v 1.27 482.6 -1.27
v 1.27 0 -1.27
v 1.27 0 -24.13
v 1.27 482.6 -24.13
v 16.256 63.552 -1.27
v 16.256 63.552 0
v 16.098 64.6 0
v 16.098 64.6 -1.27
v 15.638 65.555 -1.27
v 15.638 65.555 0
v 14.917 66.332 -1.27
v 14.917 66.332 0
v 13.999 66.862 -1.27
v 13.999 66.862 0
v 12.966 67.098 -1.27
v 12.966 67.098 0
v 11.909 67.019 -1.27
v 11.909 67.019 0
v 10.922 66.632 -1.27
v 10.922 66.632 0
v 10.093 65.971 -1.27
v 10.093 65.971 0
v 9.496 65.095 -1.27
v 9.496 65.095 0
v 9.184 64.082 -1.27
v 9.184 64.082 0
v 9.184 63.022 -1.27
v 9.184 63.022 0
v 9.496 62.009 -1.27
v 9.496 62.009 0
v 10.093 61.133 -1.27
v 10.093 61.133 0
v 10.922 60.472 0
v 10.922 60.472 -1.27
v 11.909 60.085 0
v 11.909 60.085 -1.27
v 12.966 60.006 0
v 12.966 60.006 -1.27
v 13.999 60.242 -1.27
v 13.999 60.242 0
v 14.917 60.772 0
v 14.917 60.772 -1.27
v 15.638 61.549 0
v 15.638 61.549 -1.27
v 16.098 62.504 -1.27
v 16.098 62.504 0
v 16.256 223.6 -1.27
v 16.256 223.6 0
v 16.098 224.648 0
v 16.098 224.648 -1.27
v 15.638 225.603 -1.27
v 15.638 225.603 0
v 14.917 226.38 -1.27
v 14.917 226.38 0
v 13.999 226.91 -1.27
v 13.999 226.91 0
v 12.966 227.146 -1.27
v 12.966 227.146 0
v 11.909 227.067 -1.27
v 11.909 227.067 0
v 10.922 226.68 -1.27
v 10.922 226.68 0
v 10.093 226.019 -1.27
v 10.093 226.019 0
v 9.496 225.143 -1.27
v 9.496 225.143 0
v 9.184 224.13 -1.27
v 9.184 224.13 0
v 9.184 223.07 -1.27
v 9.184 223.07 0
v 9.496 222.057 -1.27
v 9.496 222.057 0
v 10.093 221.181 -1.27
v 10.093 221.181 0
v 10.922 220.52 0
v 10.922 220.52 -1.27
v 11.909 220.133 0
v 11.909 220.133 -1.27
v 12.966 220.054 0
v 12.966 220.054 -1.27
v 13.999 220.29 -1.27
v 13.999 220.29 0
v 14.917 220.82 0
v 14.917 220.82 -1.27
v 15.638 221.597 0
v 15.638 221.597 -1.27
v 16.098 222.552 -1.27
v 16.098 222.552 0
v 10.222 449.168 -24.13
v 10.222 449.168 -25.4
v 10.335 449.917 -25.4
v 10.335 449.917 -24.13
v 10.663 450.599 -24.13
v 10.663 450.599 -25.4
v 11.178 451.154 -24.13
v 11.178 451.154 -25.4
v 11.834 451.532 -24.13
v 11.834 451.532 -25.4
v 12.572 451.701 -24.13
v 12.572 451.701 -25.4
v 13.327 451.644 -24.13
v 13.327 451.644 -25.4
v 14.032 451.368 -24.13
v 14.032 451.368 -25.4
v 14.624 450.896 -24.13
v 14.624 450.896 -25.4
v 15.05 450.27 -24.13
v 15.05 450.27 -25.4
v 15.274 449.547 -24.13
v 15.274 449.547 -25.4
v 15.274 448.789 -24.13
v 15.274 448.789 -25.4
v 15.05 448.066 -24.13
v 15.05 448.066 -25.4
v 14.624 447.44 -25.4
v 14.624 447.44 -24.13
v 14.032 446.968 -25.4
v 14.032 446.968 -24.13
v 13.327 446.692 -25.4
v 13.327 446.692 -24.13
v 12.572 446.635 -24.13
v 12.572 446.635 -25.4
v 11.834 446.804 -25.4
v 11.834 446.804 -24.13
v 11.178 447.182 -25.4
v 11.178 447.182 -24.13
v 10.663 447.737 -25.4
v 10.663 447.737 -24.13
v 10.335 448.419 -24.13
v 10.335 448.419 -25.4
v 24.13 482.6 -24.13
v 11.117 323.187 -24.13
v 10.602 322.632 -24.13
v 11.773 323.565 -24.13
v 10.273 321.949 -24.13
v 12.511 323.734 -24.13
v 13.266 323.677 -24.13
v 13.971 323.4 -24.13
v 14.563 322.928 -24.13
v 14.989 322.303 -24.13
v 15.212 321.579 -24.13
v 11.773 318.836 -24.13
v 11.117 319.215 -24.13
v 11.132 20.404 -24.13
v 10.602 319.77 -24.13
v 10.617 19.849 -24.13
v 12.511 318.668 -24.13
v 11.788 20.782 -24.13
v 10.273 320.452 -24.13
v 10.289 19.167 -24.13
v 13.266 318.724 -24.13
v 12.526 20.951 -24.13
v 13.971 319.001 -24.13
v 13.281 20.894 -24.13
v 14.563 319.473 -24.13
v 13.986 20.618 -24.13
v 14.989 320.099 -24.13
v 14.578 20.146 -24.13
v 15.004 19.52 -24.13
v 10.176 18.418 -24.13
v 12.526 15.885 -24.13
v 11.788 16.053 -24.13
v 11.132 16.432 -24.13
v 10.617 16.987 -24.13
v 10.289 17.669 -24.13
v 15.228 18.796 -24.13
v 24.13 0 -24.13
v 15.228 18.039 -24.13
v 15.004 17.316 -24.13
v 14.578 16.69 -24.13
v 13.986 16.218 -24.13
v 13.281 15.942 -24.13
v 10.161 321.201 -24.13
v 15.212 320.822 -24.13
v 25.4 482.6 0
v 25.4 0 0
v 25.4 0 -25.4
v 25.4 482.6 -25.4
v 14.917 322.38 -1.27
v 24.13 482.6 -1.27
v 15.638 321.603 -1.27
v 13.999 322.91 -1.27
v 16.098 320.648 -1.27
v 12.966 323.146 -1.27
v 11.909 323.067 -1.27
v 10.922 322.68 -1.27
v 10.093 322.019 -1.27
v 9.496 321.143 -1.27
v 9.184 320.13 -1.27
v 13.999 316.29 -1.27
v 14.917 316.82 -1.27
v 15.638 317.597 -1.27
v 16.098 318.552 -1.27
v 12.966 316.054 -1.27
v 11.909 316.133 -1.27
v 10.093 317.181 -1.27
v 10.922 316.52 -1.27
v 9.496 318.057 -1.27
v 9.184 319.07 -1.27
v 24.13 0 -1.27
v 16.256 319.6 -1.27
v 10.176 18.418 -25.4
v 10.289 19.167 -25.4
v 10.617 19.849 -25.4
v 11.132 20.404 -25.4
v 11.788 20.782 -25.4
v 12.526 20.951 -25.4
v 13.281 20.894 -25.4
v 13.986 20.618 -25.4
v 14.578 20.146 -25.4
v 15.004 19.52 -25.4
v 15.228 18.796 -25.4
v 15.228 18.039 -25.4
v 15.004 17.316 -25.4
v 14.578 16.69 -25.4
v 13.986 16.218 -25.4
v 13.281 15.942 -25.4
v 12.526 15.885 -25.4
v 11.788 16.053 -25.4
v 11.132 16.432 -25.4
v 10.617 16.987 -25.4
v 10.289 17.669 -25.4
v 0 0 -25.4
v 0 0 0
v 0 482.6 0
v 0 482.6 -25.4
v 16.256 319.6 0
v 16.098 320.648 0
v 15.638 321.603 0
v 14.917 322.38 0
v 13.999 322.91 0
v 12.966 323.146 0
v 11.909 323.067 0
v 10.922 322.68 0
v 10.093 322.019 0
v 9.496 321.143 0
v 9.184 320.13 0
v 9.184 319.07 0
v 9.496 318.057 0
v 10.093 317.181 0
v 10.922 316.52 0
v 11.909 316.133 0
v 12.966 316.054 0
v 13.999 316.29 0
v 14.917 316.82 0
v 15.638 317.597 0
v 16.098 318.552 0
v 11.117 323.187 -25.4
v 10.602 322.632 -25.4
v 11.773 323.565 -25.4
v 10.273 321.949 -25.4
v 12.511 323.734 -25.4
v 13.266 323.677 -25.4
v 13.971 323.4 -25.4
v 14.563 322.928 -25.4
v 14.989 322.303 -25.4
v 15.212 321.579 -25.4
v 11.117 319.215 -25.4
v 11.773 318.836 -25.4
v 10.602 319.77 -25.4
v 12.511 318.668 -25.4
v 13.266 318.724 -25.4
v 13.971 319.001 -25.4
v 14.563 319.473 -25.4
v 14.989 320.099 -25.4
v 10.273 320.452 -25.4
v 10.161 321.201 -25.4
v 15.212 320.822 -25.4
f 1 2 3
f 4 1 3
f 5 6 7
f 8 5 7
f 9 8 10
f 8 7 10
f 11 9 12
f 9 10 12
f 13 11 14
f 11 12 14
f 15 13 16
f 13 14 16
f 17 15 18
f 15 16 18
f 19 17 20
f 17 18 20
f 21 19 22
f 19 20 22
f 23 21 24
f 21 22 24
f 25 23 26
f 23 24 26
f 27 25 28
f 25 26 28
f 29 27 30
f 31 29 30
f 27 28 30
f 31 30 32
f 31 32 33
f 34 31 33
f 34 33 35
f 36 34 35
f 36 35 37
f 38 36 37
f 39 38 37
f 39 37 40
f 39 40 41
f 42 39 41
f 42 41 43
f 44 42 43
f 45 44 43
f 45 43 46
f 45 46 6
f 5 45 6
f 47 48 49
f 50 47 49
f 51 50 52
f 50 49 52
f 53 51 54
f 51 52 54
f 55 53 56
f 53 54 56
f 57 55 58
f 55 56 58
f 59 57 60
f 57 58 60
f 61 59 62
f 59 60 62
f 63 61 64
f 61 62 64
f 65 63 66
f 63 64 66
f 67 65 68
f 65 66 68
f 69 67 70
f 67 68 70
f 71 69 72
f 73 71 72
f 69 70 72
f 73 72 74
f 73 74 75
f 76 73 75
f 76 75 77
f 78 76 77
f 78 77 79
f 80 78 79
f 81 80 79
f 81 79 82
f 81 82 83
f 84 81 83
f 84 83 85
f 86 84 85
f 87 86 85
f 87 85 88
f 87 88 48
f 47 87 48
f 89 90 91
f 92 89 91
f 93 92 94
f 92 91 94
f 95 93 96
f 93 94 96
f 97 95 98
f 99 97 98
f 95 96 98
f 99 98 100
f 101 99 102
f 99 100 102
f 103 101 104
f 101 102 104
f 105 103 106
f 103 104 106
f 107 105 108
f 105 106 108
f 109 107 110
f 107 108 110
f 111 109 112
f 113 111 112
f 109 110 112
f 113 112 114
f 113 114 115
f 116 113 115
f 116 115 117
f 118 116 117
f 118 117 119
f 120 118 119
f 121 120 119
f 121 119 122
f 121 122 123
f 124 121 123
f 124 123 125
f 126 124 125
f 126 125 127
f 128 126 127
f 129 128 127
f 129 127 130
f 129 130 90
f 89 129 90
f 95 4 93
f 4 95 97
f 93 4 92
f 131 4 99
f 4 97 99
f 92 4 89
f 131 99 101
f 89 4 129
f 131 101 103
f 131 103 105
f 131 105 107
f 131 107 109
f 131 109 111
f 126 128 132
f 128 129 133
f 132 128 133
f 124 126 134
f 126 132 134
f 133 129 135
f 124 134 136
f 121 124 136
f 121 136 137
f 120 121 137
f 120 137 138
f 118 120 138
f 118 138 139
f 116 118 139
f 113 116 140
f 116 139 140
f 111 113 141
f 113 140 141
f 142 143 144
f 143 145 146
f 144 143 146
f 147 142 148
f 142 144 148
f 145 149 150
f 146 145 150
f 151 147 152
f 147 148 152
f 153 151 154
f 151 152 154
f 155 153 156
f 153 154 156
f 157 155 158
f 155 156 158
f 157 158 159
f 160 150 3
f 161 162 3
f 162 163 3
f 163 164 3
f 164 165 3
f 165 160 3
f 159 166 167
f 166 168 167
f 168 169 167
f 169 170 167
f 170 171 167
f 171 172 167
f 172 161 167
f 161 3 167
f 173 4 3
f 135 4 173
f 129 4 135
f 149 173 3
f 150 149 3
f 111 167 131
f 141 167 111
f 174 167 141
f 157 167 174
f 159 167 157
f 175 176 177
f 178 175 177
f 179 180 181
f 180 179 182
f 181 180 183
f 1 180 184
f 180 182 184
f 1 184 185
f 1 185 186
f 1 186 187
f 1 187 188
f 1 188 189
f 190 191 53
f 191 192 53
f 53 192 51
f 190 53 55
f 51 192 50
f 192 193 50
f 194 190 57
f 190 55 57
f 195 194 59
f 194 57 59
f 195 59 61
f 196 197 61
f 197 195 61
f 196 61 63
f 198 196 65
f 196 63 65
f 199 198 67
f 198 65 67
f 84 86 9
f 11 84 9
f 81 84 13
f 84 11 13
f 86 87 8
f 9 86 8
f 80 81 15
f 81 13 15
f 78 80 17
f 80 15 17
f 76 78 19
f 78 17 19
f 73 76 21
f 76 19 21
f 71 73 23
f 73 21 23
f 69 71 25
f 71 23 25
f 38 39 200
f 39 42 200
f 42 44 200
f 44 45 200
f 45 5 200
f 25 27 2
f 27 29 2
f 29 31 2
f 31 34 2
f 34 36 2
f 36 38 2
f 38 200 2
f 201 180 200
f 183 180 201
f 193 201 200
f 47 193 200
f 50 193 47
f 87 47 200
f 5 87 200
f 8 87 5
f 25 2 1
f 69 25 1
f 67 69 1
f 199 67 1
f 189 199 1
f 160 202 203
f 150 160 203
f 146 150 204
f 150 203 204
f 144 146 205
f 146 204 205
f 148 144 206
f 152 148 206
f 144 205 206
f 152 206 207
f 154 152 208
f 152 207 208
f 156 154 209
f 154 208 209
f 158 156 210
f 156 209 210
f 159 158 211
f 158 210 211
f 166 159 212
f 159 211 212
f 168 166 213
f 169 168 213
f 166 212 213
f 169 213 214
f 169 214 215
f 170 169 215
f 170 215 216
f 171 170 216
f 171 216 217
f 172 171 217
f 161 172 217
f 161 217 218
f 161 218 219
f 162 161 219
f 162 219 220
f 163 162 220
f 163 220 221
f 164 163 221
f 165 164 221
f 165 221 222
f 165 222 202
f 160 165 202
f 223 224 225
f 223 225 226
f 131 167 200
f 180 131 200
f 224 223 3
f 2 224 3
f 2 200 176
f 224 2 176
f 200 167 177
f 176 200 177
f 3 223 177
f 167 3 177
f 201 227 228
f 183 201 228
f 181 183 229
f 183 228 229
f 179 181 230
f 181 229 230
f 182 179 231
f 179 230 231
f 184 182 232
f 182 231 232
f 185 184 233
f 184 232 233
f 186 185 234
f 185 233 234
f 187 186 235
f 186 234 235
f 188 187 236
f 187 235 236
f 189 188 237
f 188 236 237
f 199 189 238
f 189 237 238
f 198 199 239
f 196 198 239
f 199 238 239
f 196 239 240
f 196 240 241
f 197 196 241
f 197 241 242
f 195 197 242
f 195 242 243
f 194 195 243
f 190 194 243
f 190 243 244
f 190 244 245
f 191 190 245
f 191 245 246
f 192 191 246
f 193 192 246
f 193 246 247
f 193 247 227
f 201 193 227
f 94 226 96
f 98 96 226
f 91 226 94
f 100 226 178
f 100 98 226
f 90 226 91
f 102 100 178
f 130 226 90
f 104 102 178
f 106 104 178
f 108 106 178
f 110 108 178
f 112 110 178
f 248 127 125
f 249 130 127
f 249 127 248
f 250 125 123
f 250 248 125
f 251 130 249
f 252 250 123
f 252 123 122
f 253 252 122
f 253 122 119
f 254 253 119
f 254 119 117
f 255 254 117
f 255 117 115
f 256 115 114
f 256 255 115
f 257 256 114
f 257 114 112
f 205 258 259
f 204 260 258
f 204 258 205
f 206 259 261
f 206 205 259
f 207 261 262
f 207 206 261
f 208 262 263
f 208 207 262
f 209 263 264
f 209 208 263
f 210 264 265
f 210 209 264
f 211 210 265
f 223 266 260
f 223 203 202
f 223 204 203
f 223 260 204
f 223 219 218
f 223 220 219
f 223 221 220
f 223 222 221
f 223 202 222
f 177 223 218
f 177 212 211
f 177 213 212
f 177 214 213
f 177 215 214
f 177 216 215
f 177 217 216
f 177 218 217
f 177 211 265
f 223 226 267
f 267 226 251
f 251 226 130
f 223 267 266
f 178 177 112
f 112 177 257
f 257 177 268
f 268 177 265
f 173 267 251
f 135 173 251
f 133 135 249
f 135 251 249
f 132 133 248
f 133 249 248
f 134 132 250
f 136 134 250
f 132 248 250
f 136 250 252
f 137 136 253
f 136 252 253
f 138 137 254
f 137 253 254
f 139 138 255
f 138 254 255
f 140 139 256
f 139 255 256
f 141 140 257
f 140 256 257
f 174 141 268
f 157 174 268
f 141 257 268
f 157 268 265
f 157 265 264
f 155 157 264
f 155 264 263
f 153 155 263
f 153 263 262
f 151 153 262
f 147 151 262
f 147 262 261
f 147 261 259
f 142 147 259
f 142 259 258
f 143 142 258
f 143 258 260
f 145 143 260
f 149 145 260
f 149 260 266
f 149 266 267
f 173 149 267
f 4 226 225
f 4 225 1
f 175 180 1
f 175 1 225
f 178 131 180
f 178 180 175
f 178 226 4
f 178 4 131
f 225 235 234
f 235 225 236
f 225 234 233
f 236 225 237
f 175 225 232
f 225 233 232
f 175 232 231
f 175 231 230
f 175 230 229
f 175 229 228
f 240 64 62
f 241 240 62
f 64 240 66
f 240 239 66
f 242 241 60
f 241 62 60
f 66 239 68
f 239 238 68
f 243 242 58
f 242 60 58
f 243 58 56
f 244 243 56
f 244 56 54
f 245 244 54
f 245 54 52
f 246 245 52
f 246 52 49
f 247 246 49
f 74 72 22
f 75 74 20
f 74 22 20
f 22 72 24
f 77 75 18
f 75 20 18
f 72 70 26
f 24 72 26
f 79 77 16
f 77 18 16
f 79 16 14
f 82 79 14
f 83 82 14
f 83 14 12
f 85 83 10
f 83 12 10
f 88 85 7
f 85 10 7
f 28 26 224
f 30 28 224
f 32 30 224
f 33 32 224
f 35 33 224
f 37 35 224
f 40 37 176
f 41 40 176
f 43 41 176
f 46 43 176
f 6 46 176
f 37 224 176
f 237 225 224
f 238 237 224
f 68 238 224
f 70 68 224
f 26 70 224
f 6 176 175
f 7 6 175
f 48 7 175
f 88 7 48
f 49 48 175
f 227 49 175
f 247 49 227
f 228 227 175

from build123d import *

# Parameters (mm, degrees)
SKETCH1_W           = 25.4
SKETCH1_H           = 25.4
BOSS_EXTRUDE1_DEPTH = 482.6
SKETCH3_R           = 2.54
CUT_EXTRUDE1_DEPTH  = 2.54
SKETCH4_R           = 2.54
CUT_EXTRUDE2_DEPTH  = 2.54
SKETCH5_R           = 2.54
CUT_EXTRUDE3_DEPTH  = 2.54
SKETCH6_R           = 3.556
CUT_EXTRUDE4_DEPTH  = 2.54
SKETCH7_R           = 3.556
CUT_EXTRUDE5_DEPTH  = 2.54


with BuildPart() as part:
    # Sketch1 → Boss-Extrude1 (new body)
    with BuildSketch(Plane(origin=(0, 0, 0), x_dir=(1, 0, 0), z_dir=(0, 1, 0))):
        with Locations((12.7, 12.7)):
            Rectangle(SKETCH1_W, SKETCH1_H)
        Polygon((1.27, 12.361459156), (1.27, 24.13), (12.7, 24.13), (24.13, 24.13), (24.13, 12.7), (24.13, 1.27), (12.7, 1.27), (1.27, 1.27), align=None, mode=Mode.SUBTRACT)
    extrude(amount=BOSS_EXTRUDE1_DEPTH)

    # Sketch3 → Cut-Extrude1 (cut)
    with BuildSketch(Plane(origin=(0, 0, -25.4), x_dir=(-1, 0, 0), z_dir=(0, 0, -1))):
        with Locations((-12.762028981, 449.168015032)):
            Circle(SKETCH3_R)
    extrude(amount=-CUT_EXTRUDE1_DEPTH, mode=Mode.SUBTRACT)

    # Sketch4 → Cut-Extrude2 (cut)
    with BuildSketch(Plane(origin=(0, 0, -25.4), x_dir=(-1, 0, 0), z_dir=(0, 0, -1))):
        with Locations((-12.70057371, 321.200750094)):
            Circle(SKETCH4_R)
    extrude(amount=-CUT_EXTRUDE2_DEPTH, mode=Mode.SUBTRACT)

    # Sketch5 → Cut-Extrude3 (cut)
    with BuildSketch(Plane(origin=(0, 0, -25.4), x_dir=(-1, 0, 0), z_dir=(0, 0, -1))):
        with Locations((-12.715968996, 18.41791766)):
            Circle(SKETCH5_R)
    extrude(amount=-CUT_EXTRUDE3_DEPTH, mode=Mode.SUBTRACT)

    # Sketch6 → Cut-Extrude4 (cut)
    with BuildSketch(Plane.XY):
        with Locations((12.7, 63.552)):
            Circle(SKETCH6_R)
    extrude(amount=-CUT_EXTRUDE4_DEPTH, mode=Mode.SUBTRACT)

    # Sketch7 → Cut-Extrude5 (cut)
    with BuildSketch(Plane.XY):
        with Locations((12.7, 223.6)):
            Circle(SKETCH7_R)
        with Locations((12.7, 319.6)):
            Circle(SKETCH7_R)
    extrude(amount=-CUT_EXTRUDE5_DEPTH, mode=Mode.SUBTRACT)


solid = part.part
